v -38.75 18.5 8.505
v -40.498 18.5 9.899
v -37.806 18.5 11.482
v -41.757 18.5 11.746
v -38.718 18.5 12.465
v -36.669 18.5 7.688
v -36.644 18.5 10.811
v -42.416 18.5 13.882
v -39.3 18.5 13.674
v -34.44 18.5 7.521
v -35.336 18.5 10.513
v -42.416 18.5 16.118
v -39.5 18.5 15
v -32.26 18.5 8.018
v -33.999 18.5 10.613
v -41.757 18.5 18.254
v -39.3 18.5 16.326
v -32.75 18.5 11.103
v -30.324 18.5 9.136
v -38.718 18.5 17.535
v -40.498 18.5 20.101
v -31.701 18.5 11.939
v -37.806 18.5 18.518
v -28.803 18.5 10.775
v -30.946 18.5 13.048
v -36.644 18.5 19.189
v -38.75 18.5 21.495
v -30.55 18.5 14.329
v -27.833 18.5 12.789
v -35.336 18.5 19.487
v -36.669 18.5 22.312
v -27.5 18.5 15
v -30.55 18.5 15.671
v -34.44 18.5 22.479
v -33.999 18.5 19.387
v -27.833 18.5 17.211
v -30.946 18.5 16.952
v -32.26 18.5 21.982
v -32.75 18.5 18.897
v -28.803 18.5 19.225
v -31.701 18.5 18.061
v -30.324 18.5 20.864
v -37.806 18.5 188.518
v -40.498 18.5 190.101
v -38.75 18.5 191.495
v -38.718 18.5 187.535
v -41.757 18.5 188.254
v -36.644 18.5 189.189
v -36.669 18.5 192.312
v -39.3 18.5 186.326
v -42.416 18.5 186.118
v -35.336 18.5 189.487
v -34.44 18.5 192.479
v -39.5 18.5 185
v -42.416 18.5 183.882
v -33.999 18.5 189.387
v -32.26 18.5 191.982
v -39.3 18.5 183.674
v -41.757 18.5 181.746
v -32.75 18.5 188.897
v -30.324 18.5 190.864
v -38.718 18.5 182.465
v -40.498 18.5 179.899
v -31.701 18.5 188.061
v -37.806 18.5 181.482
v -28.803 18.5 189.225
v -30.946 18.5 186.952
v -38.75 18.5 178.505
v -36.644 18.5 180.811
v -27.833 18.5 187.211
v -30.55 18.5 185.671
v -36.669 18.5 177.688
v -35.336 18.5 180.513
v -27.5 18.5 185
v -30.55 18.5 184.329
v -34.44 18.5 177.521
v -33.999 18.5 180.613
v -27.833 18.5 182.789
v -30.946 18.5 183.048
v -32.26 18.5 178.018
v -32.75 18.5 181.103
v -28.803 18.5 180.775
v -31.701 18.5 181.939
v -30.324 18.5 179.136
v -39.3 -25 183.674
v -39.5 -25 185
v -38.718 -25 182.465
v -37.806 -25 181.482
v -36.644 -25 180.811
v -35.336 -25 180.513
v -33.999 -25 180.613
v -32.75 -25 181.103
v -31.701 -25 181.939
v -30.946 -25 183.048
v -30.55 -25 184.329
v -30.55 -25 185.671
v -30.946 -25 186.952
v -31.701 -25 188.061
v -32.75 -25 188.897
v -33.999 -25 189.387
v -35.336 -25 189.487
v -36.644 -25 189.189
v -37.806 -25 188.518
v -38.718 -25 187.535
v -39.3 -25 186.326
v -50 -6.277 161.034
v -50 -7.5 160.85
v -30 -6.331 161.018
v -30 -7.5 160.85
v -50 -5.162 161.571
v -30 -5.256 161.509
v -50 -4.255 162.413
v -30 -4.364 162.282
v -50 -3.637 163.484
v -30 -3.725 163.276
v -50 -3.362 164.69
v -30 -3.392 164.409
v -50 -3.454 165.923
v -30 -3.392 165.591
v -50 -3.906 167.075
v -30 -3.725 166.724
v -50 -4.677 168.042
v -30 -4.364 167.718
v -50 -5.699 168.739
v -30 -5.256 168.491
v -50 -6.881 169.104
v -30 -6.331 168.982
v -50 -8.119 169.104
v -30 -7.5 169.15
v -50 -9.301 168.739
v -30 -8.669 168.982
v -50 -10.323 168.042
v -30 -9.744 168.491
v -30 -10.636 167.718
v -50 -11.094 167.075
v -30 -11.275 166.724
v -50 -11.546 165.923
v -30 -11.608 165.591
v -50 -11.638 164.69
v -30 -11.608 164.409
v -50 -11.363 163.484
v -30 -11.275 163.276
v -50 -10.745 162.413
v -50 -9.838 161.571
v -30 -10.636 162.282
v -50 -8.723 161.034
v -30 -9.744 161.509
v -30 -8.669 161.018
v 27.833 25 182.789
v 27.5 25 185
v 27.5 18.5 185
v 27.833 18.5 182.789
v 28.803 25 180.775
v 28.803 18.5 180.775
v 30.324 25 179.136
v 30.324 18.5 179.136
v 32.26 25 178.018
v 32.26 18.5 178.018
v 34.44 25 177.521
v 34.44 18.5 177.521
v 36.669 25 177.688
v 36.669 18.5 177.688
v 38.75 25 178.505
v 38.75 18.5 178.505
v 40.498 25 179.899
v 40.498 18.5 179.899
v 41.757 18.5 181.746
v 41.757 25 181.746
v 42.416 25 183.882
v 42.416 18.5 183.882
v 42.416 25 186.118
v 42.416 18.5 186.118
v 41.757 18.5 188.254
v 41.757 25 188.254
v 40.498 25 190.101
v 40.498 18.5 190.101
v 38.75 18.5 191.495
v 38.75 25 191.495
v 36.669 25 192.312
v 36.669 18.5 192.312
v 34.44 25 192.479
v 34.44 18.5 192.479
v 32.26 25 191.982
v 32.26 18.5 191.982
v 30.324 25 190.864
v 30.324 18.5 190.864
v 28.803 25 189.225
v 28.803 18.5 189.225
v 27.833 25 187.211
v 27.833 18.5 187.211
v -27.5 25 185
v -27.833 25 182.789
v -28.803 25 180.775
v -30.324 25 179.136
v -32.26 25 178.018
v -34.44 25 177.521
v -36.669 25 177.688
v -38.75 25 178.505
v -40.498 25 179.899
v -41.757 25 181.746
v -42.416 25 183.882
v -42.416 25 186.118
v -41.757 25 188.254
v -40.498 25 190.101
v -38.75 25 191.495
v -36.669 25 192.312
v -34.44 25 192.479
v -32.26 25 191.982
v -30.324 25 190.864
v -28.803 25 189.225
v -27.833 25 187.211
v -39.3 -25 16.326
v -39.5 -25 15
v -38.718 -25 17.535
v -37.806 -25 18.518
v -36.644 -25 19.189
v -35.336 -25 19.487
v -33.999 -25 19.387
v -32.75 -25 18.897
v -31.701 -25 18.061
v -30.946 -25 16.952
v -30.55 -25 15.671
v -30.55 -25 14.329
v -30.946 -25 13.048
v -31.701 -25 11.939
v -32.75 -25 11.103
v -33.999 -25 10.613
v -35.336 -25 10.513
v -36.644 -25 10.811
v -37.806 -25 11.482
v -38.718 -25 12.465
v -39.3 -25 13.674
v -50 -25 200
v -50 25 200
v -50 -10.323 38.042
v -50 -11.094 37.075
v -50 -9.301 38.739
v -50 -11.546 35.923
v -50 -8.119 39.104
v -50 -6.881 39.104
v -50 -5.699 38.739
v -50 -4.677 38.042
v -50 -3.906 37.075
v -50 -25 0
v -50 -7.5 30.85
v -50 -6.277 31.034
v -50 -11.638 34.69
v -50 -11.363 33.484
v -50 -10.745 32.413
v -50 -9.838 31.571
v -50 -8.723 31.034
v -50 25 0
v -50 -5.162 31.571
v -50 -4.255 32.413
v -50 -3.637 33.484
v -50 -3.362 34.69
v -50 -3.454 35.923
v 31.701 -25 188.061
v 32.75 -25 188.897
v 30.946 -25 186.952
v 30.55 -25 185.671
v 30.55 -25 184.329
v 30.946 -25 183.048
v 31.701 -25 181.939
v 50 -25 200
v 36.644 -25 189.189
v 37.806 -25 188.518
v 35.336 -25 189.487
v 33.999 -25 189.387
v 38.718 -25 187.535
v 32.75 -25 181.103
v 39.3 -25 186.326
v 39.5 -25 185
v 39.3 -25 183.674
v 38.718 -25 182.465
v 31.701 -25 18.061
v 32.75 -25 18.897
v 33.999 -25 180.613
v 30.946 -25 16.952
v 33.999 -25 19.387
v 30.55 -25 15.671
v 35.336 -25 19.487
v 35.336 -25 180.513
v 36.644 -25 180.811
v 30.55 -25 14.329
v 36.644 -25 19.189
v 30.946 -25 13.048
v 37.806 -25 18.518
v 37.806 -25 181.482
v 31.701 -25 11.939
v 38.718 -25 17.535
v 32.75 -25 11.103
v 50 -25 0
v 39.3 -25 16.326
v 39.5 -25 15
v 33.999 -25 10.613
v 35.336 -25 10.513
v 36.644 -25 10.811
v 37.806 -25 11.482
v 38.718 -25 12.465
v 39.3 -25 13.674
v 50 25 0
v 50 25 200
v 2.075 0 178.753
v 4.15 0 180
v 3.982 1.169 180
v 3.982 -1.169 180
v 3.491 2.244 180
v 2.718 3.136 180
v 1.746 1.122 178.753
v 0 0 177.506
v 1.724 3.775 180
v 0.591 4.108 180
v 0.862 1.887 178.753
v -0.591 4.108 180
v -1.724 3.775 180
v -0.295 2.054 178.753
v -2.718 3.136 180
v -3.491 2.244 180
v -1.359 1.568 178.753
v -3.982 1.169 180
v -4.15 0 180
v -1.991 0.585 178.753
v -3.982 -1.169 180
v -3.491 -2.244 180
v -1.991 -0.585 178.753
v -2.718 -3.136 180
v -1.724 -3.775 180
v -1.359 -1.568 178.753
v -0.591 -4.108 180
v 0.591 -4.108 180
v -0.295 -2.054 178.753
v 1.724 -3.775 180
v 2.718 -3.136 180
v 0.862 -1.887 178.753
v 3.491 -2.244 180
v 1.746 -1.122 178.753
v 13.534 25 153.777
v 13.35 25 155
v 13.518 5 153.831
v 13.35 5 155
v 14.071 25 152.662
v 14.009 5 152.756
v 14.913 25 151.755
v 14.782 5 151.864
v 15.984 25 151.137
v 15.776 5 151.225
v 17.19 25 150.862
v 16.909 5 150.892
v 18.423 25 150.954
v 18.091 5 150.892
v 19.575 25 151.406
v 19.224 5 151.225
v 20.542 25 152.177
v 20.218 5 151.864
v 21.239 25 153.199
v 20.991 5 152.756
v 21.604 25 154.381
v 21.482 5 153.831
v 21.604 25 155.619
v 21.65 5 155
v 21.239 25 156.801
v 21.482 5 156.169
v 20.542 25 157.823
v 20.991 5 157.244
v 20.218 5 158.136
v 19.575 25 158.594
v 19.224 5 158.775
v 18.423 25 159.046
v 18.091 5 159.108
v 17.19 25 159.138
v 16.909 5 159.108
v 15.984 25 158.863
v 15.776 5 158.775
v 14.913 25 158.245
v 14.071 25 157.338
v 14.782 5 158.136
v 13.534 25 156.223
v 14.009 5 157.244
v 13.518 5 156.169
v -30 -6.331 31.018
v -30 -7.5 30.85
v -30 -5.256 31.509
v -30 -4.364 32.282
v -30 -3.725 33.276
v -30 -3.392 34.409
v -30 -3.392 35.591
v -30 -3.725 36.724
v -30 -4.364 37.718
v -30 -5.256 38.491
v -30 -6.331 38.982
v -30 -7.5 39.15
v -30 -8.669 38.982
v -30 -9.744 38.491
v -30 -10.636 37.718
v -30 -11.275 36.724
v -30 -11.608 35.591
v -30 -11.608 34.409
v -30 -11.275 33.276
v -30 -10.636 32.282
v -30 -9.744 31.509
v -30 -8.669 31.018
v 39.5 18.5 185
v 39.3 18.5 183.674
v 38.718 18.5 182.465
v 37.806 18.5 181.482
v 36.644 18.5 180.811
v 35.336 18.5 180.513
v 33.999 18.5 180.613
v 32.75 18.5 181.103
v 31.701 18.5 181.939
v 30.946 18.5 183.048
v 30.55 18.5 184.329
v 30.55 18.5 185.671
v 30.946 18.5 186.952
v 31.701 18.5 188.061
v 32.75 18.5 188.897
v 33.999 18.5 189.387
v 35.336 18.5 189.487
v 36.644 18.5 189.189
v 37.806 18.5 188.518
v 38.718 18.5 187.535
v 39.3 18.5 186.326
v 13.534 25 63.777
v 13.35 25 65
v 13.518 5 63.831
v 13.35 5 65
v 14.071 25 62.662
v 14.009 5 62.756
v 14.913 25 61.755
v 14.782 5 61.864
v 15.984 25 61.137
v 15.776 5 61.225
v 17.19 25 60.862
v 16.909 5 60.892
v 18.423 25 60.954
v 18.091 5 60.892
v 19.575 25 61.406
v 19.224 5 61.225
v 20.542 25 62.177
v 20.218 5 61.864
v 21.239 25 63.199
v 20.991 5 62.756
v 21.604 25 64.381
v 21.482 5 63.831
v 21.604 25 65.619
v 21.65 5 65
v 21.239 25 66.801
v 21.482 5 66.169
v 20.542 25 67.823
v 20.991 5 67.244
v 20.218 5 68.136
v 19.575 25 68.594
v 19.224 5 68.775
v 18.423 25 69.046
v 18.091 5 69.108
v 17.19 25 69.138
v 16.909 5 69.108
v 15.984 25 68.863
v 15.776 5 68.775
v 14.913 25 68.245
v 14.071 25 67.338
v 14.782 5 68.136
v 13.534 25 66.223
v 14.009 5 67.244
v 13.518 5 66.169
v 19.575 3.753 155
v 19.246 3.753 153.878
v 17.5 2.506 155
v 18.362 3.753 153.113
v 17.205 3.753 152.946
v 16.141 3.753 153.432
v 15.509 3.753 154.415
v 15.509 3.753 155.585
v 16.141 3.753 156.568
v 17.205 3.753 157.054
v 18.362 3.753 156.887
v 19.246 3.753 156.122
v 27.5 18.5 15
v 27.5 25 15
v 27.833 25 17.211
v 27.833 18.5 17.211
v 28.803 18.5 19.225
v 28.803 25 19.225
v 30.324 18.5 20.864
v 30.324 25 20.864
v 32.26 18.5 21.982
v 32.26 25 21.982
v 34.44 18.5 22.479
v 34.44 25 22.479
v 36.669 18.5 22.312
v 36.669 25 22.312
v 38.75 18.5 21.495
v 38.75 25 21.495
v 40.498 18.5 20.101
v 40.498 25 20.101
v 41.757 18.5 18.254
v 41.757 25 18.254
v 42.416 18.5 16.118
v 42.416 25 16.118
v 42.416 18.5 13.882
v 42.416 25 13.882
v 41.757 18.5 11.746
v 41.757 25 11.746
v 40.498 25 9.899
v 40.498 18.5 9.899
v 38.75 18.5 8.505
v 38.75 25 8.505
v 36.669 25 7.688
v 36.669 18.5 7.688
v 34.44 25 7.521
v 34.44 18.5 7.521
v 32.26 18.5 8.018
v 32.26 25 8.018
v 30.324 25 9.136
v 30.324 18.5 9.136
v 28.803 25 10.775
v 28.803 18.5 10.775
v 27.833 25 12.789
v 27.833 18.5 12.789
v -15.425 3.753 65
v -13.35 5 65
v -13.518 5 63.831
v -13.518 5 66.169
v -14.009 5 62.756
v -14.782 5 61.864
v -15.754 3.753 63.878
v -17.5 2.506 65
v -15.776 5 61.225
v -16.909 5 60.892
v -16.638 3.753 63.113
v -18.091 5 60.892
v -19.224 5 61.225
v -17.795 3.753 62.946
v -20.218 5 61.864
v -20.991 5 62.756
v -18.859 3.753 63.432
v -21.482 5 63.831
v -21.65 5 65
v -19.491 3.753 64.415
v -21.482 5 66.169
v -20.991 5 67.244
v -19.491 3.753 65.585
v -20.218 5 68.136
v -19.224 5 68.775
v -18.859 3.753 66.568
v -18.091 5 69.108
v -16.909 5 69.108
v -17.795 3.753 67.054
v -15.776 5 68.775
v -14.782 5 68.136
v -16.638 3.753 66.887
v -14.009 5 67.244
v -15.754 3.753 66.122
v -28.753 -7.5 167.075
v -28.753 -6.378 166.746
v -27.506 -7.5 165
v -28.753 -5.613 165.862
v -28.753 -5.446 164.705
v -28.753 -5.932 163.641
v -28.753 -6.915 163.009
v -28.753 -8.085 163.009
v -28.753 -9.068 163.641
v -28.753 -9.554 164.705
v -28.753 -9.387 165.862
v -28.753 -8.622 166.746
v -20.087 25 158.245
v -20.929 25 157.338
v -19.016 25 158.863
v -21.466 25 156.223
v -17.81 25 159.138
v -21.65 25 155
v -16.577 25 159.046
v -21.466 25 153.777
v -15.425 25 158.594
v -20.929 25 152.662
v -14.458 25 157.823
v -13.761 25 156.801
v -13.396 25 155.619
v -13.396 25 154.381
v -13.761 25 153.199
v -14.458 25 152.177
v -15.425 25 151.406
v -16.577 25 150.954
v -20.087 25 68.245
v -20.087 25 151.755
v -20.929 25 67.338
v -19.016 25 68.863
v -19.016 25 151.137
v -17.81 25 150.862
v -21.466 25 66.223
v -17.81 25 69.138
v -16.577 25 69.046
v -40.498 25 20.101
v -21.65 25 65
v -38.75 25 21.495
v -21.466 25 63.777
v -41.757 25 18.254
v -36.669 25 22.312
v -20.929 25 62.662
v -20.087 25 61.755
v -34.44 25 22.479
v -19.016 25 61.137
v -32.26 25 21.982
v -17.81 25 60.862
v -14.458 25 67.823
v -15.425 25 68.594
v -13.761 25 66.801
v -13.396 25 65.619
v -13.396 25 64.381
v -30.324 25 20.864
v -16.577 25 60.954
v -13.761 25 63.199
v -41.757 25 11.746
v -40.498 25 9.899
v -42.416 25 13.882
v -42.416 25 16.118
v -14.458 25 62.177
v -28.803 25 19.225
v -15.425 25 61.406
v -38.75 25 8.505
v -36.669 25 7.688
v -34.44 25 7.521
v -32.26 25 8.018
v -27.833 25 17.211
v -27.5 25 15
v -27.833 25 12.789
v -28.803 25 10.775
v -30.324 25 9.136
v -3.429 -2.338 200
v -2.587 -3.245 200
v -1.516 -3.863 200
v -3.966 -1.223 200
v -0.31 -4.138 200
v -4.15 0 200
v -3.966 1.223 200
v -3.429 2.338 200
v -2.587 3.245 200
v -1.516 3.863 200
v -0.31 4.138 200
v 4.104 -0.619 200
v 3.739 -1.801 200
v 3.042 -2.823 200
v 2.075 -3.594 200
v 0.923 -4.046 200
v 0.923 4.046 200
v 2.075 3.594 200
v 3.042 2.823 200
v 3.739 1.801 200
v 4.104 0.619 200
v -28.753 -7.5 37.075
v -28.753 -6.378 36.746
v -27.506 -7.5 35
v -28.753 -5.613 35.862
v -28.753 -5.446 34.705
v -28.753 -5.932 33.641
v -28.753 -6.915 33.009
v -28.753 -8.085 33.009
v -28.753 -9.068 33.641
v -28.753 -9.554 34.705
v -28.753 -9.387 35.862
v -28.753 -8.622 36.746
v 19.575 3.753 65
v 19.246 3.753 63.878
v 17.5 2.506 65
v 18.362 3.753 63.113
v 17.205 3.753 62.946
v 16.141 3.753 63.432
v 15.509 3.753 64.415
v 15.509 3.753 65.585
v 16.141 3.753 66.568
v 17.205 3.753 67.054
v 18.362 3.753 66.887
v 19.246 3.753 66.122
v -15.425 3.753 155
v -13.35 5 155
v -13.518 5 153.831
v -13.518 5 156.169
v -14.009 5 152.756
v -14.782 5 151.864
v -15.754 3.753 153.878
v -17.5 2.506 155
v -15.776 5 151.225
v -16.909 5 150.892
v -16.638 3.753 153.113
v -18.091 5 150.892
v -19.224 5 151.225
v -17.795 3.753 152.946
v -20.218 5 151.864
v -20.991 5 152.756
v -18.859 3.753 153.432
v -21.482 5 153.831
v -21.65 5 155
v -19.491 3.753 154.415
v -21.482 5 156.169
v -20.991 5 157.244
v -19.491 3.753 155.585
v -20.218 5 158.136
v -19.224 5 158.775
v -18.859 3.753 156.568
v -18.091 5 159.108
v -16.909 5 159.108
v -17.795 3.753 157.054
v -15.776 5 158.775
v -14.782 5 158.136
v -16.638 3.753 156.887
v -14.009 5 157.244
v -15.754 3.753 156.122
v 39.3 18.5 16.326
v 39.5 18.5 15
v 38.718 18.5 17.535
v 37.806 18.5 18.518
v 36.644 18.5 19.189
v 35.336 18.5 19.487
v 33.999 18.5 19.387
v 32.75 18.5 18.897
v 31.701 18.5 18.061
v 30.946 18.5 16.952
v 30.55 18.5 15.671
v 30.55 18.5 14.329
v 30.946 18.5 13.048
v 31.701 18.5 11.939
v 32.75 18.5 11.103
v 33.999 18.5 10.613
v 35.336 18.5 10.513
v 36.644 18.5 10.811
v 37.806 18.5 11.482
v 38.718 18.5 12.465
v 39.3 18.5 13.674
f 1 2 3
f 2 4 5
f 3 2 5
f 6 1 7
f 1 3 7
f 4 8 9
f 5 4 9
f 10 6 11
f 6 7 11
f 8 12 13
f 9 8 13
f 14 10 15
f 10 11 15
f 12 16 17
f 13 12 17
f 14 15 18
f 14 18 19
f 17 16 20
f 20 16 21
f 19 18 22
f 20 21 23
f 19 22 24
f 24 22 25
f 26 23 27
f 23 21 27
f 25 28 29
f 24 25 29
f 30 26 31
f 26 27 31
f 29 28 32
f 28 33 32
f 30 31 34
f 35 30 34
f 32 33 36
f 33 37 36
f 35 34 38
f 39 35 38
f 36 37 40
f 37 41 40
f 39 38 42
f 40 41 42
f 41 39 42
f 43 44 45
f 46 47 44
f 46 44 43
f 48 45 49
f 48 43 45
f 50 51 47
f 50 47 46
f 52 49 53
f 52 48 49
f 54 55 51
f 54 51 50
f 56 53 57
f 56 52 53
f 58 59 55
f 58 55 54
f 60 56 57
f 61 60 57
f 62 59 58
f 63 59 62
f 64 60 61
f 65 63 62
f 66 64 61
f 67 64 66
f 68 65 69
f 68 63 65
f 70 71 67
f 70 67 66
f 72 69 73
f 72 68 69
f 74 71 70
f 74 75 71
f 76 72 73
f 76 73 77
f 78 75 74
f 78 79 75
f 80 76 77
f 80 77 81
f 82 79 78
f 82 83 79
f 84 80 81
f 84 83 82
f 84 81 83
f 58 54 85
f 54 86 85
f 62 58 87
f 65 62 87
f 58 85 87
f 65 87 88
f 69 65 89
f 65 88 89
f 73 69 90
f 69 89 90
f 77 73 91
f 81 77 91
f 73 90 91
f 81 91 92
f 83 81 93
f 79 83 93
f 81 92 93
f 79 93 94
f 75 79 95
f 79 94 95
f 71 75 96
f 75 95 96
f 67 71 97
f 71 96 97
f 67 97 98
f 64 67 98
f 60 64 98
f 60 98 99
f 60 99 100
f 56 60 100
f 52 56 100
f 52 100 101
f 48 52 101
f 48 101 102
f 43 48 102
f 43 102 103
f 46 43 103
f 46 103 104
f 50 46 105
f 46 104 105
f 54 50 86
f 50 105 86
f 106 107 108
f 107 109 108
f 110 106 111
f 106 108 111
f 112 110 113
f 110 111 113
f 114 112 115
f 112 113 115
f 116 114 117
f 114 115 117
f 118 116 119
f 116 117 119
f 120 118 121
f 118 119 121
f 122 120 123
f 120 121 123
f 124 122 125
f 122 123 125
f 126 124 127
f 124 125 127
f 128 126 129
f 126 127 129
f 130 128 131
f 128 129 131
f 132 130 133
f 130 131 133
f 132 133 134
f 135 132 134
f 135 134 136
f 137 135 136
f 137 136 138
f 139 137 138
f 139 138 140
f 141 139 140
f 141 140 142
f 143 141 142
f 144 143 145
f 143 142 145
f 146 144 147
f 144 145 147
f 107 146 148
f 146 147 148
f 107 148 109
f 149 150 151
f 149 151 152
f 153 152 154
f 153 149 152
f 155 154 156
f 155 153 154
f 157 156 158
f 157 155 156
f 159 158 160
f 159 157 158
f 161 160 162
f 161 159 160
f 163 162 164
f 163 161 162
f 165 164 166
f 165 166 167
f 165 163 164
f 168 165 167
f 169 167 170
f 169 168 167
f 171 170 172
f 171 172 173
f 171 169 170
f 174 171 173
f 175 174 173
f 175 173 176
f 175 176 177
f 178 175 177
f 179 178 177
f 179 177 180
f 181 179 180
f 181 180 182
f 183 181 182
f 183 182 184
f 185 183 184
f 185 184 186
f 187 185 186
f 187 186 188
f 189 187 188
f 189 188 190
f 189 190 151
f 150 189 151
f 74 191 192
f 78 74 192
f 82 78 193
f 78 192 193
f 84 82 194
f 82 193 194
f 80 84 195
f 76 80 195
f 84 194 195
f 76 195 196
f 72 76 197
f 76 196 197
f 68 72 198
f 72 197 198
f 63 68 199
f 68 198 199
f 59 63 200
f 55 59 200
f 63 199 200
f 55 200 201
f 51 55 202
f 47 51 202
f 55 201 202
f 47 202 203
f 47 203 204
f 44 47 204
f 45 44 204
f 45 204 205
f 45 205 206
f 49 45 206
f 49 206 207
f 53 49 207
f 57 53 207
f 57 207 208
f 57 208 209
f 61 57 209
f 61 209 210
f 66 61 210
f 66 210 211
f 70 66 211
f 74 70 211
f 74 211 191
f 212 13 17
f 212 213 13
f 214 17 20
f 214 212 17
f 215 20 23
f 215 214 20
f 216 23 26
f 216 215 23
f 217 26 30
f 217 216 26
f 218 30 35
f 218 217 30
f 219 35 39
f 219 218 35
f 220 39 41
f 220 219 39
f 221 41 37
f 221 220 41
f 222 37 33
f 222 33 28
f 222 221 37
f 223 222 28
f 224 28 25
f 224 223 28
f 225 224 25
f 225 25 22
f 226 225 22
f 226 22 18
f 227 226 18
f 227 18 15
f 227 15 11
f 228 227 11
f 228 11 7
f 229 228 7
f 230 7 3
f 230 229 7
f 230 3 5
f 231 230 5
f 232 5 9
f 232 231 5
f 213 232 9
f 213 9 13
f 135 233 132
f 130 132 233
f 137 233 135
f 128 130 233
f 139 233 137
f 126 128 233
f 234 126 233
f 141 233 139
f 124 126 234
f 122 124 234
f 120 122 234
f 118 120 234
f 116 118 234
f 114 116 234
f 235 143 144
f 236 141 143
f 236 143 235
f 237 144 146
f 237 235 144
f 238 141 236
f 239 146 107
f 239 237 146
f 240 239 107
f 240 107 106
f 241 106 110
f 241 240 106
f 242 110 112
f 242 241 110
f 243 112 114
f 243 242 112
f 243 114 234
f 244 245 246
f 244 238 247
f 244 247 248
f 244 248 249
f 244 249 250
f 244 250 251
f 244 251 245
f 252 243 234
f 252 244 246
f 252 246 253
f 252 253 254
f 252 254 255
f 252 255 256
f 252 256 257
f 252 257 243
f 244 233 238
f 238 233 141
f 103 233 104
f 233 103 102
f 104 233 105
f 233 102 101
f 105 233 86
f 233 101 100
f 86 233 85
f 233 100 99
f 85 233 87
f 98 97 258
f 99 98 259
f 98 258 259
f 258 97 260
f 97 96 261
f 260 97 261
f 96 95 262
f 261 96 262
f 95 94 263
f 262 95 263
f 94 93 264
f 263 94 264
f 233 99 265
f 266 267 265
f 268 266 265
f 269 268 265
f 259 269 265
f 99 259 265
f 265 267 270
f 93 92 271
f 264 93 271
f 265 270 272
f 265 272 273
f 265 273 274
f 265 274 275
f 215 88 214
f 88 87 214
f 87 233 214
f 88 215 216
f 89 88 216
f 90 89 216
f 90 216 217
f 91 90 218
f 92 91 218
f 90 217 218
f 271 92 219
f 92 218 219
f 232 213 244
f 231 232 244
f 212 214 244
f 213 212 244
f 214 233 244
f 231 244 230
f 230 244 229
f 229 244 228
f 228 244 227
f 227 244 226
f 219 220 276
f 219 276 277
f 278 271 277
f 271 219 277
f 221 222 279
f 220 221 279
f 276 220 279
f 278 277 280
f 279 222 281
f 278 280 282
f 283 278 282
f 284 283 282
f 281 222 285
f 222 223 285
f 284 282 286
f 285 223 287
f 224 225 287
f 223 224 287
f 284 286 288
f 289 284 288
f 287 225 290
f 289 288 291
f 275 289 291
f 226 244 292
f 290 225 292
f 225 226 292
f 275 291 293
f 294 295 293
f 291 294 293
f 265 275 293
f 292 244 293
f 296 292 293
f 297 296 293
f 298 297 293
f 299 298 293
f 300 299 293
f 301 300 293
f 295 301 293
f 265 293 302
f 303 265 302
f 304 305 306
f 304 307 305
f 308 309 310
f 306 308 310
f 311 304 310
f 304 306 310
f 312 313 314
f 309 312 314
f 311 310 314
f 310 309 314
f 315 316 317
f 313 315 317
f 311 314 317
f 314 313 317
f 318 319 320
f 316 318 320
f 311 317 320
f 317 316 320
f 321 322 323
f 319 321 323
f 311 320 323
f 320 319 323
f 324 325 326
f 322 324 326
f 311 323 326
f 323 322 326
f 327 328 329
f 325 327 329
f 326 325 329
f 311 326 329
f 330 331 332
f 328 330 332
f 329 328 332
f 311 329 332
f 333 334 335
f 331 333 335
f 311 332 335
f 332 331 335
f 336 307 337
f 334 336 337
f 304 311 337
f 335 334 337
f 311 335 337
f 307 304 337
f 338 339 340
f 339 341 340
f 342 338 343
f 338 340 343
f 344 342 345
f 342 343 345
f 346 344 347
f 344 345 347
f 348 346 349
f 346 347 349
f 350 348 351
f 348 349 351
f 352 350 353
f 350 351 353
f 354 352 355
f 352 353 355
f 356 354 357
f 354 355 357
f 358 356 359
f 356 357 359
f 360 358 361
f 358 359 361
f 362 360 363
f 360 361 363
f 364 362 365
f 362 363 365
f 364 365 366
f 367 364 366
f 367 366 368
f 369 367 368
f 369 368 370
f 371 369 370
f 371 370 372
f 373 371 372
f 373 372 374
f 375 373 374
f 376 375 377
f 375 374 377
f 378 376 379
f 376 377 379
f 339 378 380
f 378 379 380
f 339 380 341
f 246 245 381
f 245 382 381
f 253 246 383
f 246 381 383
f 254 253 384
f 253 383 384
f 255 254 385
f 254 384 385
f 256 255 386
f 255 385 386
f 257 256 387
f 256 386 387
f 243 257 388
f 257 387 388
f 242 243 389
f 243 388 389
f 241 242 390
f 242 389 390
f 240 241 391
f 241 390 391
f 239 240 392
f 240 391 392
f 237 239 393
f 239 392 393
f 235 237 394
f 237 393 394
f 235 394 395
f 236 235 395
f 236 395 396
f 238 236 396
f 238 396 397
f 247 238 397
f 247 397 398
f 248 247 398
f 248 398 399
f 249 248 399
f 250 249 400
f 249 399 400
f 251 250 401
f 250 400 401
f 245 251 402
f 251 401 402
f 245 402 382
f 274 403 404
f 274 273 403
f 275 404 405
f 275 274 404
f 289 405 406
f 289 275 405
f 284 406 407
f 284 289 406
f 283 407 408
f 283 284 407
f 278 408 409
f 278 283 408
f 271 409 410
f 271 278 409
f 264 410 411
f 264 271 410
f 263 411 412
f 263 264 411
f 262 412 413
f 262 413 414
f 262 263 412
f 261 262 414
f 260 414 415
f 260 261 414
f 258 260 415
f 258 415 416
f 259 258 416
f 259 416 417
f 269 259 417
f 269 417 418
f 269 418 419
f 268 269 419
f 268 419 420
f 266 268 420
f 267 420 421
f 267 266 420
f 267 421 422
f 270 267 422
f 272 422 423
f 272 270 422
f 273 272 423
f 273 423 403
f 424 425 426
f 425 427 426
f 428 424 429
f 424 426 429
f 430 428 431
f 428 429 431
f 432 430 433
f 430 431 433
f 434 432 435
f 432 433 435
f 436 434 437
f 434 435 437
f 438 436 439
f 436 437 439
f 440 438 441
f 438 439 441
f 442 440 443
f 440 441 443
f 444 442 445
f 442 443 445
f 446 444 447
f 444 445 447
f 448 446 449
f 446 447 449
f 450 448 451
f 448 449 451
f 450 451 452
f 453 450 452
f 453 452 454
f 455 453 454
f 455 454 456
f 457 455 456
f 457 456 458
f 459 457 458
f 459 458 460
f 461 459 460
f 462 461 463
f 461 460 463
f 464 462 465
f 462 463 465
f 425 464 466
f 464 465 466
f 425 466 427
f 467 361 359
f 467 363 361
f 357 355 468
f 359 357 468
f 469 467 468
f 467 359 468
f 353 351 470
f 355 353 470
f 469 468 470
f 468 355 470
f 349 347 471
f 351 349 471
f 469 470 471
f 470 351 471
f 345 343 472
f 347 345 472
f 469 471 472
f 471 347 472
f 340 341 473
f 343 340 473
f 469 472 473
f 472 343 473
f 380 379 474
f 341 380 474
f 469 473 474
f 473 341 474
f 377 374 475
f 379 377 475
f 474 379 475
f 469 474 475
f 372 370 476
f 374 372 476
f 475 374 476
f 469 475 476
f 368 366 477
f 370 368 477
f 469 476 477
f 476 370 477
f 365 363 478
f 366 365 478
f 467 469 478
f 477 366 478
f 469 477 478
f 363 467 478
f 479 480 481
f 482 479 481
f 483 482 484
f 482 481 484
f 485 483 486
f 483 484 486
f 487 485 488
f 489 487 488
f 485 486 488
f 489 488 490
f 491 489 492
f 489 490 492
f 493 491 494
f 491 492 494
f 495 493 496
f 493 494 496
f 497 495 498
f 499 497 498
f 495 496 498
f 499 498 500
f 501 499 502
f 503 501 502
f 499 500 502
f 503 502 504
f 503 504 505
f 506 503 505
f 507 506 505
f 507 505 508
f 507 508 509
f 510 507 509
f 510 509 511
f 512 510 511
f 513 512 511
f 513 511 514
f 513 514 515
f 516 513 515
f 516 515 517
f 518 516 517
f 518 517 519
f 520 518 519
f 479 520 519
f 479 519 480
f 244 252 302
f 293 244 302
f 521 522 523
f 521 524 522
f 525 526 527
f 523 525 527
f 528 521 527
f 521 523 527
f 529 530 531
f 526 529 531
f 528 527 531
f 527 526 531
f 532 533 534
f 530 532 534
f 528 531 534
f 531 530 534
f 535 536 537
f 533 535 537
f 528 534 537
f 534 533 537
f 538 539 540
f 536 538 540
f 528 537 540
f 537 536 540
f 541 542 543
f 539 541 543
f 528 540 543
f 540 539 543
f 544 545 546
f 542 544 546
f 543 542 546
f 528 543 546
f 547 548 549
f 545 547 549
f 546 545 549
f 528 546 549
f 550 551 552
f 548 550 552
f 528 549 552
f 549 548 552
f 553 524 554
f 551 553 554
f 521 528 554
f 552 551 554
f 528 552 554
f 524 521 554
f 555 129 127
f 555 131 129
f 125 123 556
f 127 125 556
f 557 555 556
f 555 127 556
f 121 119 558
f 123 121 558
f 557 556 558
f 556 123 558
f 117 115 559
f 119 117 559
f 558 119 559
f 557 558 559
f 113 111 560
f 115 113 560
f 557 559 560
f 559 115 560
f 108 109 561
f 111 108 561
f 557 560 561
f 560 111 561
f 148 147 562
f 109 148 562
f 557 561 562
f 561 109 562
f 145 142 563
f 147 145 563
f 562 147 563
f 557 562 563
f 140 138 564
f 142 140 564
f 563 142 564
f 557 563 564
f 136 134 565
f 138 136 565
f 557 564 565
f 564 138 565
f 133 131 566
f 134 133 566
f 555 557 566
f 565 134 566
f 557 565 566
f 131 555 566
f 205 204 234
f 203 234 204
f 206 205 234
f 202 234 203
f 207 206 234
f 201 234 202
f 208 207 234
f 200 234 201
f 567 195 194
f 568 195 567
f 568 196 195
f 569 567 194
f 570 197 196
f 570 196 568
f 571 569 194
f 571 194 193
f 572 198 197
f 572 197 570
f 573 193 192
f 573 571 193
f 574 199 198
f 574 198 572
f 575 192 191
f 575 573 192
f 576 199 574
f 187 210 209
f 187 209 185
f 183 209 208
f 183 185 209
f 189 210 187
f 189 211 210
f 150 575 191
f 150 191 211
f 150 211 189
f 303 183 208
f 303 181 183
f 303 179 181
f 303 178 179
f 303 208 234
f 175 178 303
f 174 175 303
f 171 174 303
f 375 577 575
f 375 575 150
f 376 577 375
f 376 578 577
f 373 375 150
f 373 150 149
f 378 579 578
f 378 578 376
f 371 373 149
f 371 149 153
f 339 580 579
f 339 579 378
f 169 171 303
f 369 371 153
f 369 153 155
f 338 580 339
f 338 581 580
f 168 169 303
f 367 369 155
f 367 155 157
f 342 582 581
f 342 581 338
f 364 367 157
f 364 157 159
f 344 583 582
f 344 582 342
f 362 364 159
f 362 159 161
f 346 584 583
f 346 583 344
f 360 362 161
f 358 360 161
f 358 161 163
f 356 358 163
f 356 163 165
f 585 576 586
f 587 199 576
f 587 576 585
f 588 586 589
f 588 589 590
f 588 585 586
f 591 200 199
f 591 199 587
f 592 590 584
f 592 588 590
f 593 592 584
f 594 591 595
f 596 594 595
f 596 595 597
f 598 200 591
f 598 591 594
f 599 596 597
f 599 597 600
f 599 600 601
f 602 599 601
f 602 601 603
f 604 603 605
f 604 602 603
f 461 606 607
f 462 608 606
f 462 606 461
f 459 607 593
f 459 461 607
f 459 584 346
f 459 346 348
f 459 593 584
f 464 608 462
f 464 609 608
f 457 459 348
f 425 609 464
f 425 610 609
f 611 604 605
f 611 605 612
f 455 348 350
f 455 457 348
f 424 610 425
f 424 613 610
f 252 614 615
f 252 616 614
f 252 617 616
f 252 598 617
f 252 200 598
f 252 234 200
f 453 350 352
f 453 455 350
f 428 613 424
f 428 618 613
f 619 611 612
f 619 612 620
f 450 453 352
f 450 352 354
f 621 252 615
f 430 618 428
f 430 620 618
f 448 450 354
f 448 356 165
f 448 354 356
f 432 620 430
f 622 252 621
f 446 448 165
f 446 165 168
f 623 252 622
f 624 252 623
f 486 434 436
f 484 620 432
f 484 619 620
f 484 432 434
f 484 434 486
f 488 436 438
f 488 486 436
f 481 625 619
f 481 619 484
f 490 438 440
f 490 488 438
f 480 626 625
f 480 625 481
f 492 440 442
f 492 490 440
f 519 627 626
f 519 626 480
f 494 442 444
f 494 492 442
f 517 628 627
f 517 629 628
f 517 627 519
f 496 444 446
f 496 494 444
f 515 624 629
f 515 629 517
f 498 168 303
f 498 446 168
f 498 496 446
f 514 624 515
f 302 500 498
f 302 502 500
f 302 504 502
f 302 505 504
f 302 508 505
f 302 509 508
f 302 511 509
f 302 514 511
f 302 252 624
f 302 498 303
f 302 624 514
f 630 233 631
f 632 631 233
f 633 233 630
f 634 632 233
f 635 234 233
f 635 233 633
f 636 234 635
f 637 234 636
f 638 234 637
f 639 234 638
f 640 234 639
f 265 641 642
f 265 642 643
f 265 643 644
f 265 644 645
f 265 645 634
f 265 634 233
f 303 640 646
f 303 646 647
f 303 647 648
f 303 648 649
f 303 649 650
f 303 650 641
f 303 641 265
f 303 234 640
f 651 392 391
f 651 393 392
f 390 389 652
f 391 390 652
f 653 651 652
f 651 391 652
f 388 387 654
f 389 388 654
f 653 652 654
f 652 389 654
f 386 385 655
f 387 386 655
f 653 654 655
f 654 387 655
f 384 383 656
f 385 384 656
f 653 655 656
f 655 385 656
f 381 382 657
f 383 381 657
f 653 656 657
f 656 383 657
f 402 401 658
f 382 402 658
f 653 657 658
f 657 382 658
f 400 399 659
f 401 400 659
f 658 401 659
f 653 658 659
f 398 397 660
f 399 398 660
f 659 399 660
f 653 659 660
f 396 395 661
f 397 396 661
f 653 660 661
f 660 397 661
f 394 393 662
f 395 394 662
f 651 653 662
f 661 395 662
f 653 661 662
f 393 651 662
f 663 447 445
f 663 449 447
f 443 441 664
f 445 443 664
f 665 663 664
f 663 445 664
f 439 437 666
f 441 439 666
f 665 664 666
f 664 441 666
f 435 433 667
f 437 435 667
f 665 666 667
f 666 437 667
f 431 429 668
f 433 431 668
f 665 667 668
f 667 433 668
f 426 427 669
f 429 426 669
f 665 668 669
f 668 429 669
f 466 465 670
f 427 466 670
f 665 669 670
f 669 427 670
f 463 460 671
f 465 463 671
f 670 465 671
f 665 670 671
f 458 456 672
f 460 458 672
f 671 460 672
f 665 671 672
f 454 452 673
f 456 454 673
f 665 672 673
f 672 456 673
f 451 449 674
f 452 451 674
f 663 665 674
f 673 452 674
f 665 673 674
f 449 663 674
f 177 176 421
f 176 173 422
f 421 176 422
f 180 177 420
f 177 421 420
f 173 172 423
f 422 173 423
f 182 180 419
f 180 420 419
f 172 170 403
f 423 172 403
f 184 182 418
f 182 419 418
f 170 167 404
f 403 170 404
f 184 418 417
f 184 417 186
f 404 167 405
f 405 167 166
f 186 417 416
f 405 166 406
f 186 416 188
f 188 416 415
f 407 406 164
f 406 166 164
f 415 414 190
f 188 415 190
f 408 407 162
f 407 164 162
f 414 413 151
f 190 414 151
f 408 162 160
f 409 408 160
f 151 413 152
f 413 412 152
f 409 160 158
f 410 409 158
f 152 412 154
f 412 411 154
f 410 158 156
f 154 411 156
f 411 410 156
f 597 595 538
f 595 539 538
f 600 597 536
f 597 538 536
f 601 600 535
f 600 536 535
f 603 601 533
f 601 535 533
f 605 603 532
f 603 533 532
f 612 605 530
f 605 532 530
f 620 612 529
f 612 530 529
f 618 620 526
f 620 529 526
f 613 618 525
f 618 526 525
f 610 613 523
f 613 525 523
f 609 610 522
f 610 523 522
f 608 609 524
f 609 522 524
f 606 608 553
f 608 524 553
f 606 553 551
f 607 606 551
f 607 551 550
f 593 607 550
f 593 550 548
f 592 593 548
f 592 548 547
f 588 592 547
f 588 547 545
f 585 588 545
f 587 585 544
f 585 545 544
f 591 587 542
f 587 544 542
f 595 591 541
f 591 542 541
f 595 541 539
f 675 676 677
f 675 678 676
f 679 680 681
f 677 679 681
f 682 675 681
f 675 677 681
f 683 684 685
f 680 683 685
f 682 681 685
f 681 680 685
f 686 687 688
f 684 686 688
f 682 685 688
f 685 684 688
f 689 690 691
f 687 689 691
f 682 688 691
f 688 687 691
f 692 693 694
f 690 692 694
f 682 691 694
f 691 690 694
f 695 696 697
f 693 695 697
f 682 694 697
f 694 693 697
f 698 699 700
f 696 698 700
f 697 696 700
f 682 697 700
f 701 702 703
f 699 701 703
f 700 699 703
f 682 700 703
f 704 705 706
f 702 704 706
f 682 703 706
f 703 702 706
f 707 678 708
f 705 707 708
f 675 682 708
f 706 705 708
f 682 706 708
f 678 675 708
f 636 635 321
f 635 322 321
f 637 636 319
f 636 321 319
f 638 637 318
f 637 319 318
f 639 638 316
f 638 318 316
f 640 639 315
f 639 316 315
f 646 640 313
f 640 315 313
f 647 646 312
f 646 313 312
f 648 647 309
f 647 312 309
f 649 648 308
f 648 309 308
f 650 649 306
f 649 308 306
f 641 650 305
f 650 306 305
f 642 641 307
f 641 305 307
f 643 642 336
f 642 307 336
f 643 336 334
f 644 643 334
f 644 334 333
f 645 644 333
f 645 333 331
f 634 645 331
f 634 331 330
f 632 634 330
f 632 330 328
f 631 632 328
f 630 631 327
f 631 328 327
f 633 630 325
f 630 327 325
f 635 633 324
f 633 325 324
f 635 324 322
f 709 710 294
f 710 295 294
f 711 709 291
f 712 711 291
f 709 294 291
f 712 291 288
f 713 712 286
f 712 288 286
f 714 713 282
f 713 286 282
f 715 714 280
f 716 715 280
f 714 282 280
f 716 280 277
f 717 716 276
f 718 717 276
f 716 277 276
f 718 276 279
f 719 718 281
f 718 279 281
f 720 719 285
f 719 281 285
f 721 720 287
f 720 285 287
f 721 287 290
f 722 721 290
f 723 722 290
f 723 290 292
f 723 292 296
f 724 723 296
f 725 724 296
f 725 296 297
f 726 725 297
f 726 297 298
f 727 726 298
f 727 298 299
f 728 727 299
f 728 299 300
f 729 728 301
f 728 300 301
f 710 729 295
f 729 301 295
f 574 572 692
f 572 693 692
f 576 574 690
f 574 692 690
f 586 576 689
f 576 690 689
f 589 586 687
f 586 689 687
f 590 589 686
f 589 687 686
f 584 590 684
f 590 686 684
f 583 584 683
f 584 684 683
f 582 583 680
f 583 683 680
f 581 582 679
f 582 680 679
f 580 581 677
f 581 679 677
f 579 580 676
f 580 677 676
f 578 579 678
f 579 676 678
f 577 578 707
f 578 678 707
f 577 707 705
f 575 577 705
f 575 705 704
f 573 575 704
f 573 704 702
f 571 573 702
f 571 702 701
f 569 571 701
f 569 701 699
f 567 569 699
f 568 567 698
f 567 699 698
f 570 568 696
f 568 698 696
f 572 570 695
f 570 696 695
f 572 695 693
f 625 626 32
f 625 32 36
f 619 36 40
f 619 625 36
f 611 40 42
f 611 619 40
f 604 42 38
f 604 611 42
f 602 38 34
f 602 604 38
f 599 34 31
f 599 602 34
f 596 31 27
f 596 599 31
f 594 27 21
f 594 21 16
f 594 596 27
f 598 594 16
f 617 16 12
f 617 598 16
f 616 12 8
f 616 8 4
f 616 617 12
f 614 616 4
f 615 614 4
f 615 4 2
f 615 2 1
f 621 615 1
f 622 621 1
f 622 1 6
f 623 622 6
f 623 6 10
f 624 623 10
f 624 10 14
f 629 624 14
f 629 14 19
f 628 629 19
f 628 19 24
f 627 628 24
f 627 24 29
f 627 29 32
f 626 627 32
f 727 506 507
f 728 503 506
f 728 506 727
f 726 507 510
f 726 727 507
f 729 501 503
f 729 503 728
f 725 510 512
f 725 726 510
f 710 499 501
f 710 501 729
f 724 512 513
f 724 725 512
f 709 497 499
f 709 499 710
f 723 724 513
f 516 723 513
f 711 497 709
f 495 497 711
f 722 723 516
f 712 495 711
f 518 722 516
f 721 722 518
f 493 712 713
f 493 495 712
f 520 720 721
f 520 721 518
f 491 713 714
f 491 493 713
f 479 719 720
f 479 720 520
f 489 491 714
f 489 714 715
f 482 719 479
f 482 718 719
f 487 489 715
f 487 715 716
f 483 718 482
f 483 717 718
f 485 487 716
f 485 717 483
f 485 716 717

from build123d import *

# Parameters (mm, degrees)
SKIZZE1_W                                           = 100
SKIZZE1_H                                           = 50
AUFSATZ_LINEAR_AUSTRAGEN1_DEPTH                     = 200
STIRNSENKUNG_F_R_M8_SENKSCHRAUBE_KOPF_B_D           = 9
STIRNSENKUNG_F_R_M8_SENKSCHRAUBE_KOPF_B_CBORE_D     = 15
STIRNSENKUNG_F_R_M8_SENKSCHRAUBE_KOPF_B_CBORE_DEPTH = 6.5
SPIEGELN3_COPY_1_D                                  = 9
SPIEGELN3_COPY_1_CBORE_D                            = 15
SPIEGELN3_COPY_1_CBORE_DEPTH                        = 6.5
KERNLOCH_F_R_M8_HELICOIL0_D                         = 8.3
KERNLOCH_F_R_M8_HELICOIL0_DEPTH                     = 20
KERNLOCH_F_R_M8_HELICOIL0_TIP                       = 2.493571569
KERNLOCH_F_R_M8_HELICOIL0_2_D                       = 8.3
KERNLOCH_F_R_M8_HELICOIL0_2_DEPTH                   = 20
KERNLOCH_F_R_M8_HELICOIL0_2_TIP                     = 2.493571569
KERNLOCH_F_R_M8_HELICOIL3_D                         = 8.3
KERNLOCH_F_R_M8_HELICOIL3_DEPTH                     = 20
KERNLOCH_F_R_M8_HELICOIL3_TIP                       = 2.493571569
KERNLOCH_F_R_M8_HELICOIL4_D                         = 8.3
KERNLOCH_F_R_M8_HELICOIL4_DEPTH                     = 20
KERNLOCH_F_R_M8_HELICOIL4_TIP                       = 2.493571569


with BuildPart() as part:
    # Skizze1 → Aufsatz-Linear austragen1 (new body)
    with BuildSketch(Plane.XY):
        Rectangle(SKIZZE1_W, SKIZZE1_H)
    extrude(amount=AUFSATZ_LINEAR_AUSTRAGEN1_DEPTH)

    # Stirnsenkung für M8 Senkschraube (Kopf Button)4 (through all)
    with Locations(Plane(origin=(0, 25, 0), x_dir=(1, 0, 0), z_dir=(0, 1, 0))):
        with Locations((-35, -185)):
            stirnsenkung_f_r_m8_senkschraube_kopf_b = CounterBoreHole(STIRNSENKUNG_F_R_M8_SENKSCHRAUBE_KOPF_B_D / 2, STIRNSENKUNG_F_R_M8_SENKSCHRAUBE_KOPF_B_CBORE_D / 2, STIRNSENKUNG_F_R_M8_SENKSCHRAUBE_KOPF_B_CBORE_DEPTH)

    # Spiegeln2: Stirnsenkung für M8 Senkschraube (Kopf Button)4 across plane
    add(stirnsenkung_f_r_m8_senkschraube_kopf_b.mirror(Plane(origin=(0, 0, 0), x_dir=(0, 0, 1), z_dir=(1, 0, 0))), mode=Mode.SUBTRACT)

    # Spiegeln3: Stirnsenkung für M8 Senkschraube (Kopf Button)4 across plane
    add(stirnsenkung_f_r_m8_senkschraube_kopf_b.mirror(Plane.XY.offset(100)), mode=Mode.SUBTRACT)

    # Spiegeln3 copy 1 (through all)
    with Locations(Plane(origin=(0, 25, 200), x_dir=(-1, 0, 0), z_dir=(0, 1, 0))):
        with Locations((-35, -185)):
            CounterBoreHole(SPIEGELN3_COPY_1_D / 2, SPIEGELN3_COPY_1_CBORE_D / 2, SPIEGELN3_COPY_1_CBORE_DEPTH)

    # Kernloch f_r M8 Helicoil0
    with Locations(Plane.ZY.offset(50)):
        with Locations((35, -7.5)):
            Hole(KERNLOCH_F_R_M8_HELICOIL0_D / 2, depth=KERNLOCH_F_R_M8_HELICOIL0_DEPTH)
            with Locations((0, 0, -(KERNLOCH_F_R_M8_HELICOIL0_DEPTH + KERNLOCH_F_R_M8_HELICOIL0_TIP / 2))):  # 118° drill point
                Cone(0, KERNLOCH_F_R_M8_HELICOIL0_D / 2, KERNLOCH_F_R_M8_HELICOIL0_TIP, mode=Mode.SUBTRACT)

    # Kernloch f_r M8 Helicoil0 2
    with Locations(Plane.ZY.offset(50)):
        with Locations((165, -7.5)):
            Hole(KERNLOCH_F_R_M8_HELICOIL0_2_D / 2, depth=KERNLOCH_F_R_M8_HELICOIL0_2_DEPTH)
            with Locations((0, 0, -(KERNLOCH_F_R_M8_HELICOIL0_2_DEPTH + KERNLOCH_F_R_M8_HELICOIL0_2_TIP / 2))):  # 118° drill point
                Cone(0, KERNLOCH_F_R_M8_HELICOIL0_2_D / 2, KERNLOCH_F_R_M8_HELICOIL0_2_TIP, mode=Mode.SUBTRACT)

    # Kernloch für M8 Helicoil3
    with Locations(Plane.XY.offset(200)):
        with Locations((0, 0)):
            Hole(KERNLOCH_F_R_M8_HELICOIL3_D / 2, depth=KERNLOCH_F_R_M8_HELICOIL3_DEPTH)
            with Locations((0, 0, -(KERNLOCH_F_R_M8_HELICOIL3_DEPTH + KERNLOCH_F_R_M8_HELICOIL3_TIP / 2))):  # 118° drill point
                Cone(0, KERNLOCH_F_R_M8_HELICOIL3_D / 2, KERNLOCH_F_R_M8_HELICOIL3_TIP, mode=Mode.SUBTRACT)

    # Kernloch für M8 Helicoil4
    with Locations(Plane(origin=(0, 25, 0), x_dir=(1, 0, 0), z_dir=(0, 1, 0))):
        with Locations((-17.5, -65), (17.5, -65), (17.5, -155), (-17.5, -155)):
            Hole(KERNLOCH_F_R_M8_HELICOIL4_D / 2, depth=KERNLOCH_F_R_M8_HELICOIL4_DEPTH)
            with Locations((0, 0, -(KERNLOCH_F_R_M8_HELICOIL4_DEPTH + KERNLOCH_F_R_M8_HELICOIL4_TIP / 2))):  # 118° drill point
                Cone(0, KERNLOCH_F_R_M8_HELICOIL4_D / 2, KERNLOCH_F_R_M8_HELICOIL4_TIP, mode=Mode.SUBTRACT)


solid = part.part
